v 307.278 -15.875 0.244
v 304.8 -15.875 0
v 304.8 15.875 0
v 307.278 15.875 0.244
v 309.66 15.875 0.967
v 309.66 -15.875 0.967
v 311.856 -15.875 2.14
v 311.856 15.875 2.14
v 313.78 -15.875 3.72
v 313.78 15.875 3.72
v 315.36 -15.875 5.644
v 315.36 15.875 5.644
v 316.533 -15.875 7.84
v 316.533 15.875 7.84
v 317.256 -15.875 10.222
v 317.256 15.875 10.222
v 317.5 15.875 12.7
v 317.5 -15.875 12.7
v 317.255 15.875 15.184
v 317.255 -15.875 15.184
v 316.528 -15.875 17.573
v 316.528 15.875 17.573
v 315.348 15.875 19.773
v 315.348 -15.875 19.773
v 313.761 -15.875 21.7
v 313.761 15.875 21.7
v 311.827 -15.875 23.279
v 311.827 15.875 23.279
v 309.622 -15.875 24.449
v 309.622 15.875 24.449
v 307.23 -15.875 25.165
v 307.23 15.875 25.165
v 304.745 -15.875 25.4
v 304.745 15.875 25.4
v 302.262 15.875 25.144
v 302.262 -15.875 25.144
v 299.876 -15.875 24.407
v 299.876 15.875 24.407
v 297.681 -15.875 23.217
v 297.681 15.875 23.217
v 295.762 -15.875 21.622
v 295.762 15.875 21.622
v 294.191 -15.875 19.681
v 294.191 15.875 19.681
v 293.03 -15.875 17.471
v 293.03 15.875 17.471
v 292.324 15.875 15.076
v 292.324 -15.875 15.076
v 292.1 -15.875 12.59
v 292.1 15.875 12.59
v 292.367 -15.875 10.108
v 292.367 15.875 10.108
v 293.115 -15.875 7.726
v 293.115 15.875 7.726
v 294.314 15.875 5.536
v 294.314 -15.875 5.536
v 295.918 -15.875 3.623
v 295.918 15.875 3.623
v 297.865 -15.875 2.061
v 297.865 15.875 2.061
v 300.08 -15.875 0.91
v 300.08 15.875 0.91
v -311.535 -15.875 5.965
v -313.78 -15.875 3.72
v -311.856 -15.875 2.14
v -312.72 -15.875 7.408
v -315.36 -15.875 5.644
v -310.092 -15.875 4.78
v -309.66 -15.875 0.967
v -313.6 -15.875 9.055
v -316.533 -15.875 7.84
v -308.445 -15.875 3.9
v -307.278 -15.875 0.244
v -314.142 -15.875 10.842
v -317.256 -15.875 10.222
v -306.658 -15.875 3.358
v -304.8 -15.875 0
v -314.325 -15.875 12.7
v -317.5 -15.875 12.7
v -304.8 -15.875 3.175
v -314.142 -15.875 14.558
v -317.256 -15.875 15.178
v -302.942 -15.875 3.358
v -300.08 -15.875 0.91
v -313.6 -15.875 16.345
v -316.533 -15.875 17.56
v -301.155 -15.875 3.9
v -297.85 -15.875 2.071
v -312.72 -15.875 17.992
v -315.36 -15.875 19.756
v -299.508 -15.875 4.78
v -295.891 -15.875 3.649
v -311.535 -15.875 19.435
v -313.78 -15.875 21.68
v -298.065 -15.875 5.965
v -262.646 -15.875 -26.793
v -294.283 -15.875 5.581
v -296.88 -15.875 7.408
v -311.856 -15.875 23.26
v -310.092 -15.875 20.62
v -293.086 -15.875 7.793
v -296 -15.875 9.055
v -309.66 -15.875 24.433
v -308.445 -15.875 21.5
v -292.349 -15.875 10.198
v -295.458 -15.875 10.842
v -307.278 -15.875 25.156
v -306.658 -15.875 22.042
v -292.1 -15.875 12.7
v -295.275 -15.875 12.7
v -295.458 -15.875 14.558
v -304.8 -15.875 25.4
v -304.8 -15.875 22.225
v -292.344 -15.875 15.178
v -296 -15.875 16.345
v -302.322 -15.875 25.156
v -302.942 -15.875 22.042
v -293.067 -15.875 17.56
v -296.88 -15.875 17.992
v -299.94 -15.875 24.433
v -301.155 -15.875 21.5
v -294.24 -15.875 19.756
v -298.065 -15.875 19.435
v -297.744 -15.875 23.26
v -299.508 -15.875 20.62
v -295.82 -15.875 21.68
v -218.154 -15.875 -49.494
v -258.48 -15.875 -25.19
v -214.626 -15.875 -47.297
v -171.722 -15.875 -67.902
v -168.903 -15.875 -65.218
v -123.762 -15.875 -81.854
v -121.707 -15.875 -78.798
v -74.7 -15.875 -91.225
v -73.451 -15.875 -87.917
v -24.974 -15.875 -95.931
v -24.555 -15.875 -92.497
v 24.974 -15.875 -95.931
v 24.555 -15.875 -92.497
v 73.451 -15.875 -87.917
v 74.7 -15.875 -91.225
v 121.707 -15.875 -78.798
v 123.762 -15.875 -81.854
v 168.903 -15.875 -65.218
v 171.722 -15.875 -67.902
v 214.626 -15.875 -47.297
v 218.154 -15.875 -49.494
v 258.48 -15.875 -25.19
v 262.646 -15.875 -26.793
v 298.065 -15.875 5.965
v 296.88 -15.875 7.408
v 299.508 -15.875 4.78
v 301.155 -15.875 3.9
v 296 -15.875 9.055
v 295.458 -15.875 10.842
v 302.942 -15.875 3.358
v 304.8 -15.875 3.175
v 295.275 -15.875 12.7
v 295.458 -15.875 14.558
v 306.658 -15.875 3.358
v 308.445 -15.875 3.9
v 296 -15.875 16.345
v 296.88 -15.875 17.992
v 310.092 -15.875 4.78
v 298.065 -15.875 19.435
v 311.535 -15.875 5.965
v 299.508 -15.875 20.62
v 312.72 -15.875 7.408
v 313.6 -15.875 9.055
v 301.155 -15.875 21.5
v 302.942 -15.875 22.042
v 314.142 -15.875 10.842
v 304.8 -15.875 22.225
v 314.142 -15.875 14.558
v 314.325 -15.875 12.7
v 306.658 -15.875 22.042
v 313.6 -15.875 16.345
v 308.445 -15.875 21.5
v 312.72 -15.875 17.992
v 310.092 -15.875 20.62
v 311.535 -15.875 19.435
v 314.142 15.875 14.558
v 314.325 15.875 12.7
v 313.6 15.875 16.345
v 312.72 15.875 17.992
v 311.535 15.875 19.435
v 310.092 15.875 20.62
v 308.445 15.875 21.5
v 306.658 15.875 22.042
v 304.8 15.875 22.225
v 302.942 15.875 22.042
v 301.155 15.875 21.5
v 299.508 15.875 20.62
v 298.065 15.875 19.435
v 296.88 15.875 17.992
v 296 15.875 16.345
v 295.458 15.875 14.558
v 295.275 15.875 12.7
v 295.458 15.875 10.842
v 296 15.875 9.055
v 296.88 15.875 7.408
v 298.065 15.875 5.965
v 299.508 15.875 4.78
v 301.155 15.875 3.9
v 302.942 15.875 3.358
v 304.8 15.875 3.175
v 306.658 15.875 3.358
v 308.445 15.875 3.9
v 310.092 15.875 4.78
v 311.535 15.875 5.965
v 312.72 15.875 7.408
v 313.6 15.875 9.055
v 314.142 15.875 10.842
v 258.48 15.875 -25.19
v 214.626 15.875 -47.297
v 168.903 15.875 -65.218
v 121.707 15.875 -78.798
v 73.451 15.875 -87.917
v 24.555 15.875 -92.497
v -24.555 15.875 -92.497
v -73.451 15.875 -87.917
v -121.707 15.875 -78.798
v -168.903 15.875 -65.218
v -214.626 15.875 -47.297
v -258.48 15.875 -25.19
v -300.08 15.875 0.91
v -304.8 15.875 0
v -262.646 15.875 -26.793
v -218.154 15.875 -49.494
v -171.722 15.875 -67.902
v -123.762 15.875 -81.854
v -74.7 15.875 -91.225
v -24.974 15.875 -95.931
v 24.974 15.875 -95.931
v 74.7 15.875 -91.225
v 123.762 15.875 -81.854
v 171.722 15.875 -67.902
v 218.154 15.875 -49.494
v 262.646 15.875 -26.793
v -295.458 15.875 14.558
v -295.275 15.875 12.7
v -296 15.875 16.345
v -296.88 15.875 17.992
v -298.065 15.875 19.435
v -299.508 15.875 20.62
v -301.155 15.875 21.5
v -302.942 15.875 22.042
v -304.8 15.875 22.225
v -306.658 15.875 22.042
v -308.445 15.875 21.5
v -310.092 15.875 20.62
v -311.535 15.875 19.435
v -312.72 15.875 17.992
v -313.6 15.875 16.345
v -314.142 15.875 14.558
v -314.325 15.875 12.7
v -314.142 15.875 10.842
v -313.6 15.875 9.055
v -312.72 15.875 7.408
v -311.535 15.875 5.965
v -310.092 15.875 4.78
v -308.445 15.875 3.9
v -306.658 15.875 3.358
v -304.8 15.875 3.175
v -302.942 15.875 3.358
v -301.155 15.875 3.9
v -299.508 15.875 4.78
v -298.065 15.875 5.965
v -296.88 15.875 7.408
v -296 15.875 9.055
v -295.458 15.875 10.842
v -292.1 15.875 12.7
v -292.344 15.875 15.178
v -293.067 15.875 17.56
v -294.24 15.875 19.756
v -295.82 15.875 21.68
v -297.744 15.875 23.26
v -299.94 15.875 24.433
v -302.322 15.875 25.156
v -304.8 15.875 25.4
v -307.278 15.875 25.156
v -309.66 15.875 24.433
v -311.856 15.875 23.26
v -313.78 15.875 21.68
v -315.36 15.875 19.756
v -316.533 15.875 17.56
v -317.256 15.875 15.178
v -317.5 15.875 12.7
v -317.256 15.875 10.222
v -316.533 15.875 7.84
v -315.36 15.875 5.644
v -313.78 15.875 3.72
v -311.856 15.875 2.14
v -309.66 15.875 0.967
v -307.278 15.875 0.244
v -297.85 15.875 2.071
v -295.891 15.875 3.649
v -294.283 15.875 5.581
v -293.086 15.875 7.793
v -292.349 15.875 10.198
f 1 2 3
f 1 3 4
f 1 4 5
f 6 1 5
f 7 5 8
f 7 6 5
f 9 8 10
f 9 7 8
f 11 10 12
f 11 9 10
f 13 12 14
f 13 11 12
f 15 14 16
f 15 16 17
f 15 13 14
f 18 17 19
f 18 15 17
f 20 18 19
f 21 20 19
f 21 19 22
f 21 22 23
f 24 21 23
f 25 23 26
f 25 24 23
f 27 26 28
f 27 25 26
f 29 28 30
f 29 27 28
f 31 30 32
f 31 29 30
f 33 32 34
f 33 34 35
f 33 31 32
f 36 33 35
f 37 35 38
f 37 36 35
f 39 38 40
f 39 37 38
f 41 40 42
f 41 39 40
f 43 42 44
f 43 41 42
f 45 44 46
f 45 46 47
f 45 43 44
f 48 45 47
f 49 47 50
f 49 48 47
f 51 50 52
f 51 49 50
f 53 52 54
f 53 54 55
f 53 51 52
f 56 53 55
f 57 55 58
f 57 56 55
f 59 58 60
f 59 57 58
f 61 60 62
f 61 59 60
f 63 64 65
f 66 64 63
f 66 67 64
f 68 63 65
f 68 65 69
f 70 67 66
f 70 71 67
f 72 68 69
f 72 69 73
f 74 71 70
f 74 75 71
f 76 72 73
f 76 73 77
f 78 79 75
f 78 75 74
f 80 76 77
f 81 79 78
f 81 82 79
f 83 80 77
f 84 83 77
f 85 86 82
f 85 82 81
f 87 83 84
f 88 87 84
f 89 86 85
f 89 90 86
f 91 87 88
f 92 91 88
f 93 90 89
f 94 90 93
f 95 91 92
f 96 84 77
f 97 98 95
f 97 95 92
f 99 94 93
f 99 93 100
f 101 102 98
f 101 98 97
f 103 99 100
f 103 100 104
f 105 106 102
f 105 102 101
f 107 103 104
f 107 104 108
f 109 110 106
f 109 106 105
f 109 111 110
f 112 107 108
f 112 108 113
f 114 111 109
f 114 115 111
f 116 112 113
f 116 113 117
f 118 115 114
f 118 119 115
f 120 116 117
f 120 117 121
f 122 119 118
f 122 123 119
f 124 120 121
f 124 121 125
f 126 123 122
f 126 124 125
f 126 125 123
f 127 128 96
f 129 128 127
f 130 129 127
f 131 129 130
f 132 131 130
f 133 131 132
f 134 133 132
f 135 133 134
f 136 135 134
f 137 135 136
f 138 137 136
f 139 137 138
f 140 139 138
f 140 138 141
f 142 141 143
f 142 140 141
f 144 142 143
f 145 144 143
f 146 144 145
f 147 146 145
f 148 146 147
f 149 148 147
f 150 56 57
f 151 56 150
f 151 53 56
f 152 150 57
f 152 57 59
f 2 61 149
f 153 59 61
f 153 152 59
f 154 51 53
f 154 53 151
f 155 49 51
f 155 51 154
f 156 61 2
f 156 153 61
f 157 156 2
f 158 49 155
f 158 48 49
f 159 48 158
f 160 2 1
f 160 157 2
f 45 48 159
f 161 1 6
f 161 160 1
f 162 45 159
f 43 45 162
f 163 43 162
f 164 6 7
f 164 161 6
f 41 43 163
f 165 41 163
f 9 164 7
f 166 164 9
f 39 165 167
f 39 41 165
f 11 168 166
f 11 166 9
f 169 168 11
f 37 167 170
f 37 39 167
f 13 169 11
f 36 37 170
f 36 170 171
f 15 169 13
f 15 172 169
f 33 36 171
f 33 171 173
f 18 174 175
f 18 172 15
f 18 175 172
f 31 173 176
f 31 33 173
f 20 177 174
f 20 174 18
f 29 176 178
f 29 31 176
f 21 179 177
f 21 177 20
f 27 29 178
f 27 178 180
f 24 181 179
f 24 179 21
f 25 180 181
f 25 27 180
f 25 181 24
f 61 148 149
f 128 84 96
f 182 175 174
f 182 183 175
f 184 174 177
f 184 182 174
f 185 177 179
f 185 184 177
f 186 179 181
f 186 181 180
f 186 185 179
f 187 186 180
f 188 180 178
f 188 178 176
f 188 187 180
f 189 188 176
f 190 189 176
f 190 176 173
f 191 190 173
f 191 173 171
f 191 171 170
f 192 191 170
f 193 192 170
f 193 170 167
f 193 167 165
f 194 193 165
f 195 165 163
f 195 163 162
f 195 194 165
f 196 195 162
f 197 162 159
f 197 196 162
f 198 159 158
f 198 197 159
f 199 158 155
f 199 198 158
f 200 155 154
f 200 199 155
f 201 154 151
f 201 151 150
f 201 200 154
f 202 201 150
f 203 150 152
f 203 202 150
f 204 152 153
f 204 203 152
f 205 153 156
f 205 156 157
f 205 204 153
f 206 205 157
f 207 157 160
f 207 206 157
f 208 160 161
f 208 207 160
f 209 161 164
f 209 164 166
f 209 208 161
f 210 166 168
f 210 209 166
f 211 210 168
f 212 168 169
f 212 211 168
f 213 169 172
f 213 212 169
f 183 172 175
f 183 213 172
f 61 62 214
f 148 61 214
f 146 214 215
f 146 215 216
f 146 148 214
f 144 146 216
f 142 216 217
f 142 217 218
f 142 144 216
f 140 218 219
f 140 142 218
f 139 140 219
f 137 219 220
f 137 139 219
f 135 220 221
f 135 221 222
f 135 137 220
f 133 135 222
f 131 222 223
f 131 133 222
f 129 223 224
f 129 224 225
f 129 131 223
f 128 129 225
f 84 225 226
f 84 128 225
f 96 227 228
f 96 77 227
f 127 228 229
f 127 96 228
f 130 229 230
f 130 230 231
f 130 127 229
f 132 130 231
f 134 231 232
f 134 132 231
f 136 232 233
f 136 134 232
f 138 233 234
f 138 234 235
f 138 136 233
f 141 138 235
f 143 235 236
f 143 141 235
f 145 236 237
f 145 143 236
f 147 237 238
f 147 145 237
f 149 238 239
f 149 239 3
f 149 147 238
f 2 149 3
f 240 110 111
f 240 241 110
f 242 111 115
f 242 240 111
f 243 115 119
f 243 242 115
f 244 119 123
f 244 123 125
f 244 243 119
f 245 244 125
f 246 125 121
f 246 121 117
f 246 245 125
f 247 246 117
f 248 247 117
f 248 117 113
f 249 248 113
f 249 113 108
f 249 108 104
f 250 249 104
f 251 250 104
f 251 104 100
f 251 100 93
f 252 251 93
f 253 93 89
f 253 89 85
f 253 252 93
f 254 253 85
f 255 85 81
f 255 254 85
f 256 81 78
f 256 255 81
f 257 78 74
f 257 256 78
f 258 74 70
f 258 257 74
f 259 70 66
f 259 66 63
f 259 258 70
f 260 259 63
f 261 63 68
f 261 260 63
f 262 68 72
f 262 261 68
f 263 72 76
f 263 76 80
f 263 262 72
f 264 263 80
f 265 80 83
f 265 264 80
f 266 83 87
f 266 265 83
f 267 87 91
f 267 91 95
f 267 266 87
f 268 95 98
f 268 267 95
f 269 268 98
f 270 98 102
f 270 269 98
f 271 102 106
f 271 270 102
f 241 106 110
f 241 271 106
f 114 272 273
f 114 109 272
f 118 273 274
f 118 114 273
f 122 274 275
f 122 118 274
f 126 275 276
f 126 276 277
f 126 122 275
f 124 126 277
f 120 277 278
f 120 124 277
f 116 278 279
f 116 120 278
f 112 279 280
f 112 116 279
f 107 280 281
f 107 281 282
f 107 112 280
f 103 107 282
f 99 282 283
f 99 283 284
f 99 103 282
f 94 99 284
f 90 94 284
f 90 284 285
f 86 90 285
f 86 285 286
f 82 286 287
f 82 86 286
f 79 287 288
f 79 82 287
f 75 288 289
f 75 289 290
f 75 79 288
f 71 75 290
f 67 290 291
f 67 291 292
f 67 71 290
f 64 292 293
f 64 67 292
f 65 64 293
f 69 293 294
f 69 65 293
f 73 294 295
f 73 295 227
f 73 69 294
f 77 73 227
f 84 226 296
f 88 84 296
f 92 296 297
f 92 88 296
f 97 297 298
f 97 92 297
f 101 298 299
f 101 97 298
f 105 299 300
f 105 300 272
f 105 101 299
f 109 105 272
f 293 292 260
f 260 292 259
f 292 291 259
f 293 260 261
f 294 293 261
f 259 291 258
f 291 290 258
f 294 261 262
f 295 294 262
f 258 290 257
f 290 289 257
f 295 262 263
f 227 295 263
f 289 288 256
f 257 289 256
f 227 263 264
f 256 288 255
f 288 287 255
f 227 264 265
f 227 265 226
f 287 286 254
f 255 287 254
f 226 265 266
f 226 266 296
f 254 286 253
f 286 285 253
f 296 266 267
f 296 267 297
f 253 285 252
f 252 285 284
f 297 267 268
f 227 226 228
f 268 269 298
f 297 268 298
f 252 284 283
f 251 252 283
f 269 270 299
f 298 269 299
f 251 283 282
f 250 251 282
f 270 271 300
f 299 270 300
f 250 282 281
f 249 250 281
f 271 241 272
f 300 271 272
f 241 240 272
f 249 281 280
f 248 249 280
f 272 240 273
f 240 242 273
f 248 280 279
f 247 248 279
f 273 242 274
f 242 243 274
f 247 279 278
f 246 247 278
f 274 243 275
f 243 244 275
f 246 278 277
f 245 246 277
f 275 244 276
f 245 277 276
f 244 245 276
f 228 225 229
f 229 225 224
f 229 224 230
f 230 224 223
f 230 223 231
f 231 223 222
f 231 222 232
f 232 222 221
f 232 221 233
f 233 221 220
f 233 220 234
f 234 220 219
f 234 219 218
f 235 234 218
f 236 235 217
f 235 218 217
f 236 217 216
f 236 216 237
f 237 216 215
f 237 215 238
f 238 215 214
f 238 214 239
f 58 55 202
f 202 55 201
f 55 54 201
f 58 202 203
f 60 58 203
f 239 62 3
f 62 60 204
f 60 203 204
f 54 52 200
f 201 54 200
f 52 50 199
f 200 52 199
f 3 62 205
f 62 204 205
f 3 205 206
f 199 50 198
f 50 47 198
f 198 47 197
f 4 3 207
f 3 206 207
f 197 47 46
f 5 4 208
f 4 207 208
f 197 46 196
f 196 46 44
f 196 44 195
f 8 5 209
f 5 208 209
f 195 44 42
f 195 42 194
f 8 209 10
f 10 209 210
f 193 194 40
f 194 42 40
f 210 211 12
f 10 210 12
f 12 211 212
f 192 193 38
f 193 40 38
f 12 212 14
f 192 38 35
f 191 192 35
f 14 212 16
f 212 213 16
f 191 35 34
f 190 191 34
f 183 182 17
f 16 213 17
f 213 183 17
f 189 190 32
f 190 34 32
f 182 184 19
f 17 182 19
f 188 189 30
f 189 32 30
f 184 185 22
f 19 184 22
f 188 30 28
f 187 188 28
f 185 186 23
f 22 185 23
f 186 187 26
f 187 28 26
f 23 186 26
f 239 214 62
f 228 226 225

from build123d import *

# Parameters (mm, degrees)
F0_R     = 9.525
F1_DEPTH = 15.875


with BuildPart() as f1:
    # F0 (on Front) → F1 (new body, symmetric)
    with BuildSketch(Plane.XZ):
        with BuildLine():
            ThreePointArc((-300.0802086054, 0.9095984296), (-302.3966793747, 0.2294727468), (-304.8, 0))
            ThreePointArc((-304.8, 0), (-159.858648812, -71.8136278274), (0, -96.52))
            Line((0, -96.52), (0, -93.0700078607))
            ThreePointArc((0, -93.0700078607), (-157.2261889724, -69.0256273648), (-300.0802086054, 0.9095984296))
        make_face()
        with BuildLine():
            ThreePointArc((-292.1, 12.7), (-313.7802561211, 21.6802561211), (-304.8, 0))
            ThreePointArc((-304.8, 0), (-302.3966793747, 0.2294727468), (-300.0802086054, 0.9095984296))
            ThreePointArc((-300.0802086054, 0.9095984296), (-294.2826013028, 5.5814099258), (-292.1, 12.7))
        make_face()
        with Locations((-304.8, 12.7)):
            Circle(F0_R, mode=Mode.SUBTRACT)
        with BuildLine():
            Line((0, -93.0700078607), (0, -96.52))
            ThreePointArc((0, -96.52), (159.858648812, -71.8136278274), (304.8, 0))
            ThreePointArc((304.8, 0), (302.3966793747, 0.2294727468), (300.0802086054, 0.9095984296))
            ThreePointArc((300.0802086054, 0.9095984296), (157.2261889724, -69.0256273648), (0, -93.0700078607))
        make_face()
        with BuildLine():
            ThreePointArc((300.0802086054, 0.9095984296), (302.3966793747, 0.2294727468), (304.8, 0))
            ThreePointArc((304.8, 0), (313.7802561211, 3.7197438789), (317.5, 12.7))
            ThreePointArc((317.5, 12.7), (297.6814099258, 23.2173986972), (300.0802086054, 0.9095984296))
        make_face()
        with Locations((304.8, 12.7)):
            Circle(F0_R, mode=Mode.SUBTRACT)
    extrude(amount=F1_DEPTH, both=True)


solid = f1.part
